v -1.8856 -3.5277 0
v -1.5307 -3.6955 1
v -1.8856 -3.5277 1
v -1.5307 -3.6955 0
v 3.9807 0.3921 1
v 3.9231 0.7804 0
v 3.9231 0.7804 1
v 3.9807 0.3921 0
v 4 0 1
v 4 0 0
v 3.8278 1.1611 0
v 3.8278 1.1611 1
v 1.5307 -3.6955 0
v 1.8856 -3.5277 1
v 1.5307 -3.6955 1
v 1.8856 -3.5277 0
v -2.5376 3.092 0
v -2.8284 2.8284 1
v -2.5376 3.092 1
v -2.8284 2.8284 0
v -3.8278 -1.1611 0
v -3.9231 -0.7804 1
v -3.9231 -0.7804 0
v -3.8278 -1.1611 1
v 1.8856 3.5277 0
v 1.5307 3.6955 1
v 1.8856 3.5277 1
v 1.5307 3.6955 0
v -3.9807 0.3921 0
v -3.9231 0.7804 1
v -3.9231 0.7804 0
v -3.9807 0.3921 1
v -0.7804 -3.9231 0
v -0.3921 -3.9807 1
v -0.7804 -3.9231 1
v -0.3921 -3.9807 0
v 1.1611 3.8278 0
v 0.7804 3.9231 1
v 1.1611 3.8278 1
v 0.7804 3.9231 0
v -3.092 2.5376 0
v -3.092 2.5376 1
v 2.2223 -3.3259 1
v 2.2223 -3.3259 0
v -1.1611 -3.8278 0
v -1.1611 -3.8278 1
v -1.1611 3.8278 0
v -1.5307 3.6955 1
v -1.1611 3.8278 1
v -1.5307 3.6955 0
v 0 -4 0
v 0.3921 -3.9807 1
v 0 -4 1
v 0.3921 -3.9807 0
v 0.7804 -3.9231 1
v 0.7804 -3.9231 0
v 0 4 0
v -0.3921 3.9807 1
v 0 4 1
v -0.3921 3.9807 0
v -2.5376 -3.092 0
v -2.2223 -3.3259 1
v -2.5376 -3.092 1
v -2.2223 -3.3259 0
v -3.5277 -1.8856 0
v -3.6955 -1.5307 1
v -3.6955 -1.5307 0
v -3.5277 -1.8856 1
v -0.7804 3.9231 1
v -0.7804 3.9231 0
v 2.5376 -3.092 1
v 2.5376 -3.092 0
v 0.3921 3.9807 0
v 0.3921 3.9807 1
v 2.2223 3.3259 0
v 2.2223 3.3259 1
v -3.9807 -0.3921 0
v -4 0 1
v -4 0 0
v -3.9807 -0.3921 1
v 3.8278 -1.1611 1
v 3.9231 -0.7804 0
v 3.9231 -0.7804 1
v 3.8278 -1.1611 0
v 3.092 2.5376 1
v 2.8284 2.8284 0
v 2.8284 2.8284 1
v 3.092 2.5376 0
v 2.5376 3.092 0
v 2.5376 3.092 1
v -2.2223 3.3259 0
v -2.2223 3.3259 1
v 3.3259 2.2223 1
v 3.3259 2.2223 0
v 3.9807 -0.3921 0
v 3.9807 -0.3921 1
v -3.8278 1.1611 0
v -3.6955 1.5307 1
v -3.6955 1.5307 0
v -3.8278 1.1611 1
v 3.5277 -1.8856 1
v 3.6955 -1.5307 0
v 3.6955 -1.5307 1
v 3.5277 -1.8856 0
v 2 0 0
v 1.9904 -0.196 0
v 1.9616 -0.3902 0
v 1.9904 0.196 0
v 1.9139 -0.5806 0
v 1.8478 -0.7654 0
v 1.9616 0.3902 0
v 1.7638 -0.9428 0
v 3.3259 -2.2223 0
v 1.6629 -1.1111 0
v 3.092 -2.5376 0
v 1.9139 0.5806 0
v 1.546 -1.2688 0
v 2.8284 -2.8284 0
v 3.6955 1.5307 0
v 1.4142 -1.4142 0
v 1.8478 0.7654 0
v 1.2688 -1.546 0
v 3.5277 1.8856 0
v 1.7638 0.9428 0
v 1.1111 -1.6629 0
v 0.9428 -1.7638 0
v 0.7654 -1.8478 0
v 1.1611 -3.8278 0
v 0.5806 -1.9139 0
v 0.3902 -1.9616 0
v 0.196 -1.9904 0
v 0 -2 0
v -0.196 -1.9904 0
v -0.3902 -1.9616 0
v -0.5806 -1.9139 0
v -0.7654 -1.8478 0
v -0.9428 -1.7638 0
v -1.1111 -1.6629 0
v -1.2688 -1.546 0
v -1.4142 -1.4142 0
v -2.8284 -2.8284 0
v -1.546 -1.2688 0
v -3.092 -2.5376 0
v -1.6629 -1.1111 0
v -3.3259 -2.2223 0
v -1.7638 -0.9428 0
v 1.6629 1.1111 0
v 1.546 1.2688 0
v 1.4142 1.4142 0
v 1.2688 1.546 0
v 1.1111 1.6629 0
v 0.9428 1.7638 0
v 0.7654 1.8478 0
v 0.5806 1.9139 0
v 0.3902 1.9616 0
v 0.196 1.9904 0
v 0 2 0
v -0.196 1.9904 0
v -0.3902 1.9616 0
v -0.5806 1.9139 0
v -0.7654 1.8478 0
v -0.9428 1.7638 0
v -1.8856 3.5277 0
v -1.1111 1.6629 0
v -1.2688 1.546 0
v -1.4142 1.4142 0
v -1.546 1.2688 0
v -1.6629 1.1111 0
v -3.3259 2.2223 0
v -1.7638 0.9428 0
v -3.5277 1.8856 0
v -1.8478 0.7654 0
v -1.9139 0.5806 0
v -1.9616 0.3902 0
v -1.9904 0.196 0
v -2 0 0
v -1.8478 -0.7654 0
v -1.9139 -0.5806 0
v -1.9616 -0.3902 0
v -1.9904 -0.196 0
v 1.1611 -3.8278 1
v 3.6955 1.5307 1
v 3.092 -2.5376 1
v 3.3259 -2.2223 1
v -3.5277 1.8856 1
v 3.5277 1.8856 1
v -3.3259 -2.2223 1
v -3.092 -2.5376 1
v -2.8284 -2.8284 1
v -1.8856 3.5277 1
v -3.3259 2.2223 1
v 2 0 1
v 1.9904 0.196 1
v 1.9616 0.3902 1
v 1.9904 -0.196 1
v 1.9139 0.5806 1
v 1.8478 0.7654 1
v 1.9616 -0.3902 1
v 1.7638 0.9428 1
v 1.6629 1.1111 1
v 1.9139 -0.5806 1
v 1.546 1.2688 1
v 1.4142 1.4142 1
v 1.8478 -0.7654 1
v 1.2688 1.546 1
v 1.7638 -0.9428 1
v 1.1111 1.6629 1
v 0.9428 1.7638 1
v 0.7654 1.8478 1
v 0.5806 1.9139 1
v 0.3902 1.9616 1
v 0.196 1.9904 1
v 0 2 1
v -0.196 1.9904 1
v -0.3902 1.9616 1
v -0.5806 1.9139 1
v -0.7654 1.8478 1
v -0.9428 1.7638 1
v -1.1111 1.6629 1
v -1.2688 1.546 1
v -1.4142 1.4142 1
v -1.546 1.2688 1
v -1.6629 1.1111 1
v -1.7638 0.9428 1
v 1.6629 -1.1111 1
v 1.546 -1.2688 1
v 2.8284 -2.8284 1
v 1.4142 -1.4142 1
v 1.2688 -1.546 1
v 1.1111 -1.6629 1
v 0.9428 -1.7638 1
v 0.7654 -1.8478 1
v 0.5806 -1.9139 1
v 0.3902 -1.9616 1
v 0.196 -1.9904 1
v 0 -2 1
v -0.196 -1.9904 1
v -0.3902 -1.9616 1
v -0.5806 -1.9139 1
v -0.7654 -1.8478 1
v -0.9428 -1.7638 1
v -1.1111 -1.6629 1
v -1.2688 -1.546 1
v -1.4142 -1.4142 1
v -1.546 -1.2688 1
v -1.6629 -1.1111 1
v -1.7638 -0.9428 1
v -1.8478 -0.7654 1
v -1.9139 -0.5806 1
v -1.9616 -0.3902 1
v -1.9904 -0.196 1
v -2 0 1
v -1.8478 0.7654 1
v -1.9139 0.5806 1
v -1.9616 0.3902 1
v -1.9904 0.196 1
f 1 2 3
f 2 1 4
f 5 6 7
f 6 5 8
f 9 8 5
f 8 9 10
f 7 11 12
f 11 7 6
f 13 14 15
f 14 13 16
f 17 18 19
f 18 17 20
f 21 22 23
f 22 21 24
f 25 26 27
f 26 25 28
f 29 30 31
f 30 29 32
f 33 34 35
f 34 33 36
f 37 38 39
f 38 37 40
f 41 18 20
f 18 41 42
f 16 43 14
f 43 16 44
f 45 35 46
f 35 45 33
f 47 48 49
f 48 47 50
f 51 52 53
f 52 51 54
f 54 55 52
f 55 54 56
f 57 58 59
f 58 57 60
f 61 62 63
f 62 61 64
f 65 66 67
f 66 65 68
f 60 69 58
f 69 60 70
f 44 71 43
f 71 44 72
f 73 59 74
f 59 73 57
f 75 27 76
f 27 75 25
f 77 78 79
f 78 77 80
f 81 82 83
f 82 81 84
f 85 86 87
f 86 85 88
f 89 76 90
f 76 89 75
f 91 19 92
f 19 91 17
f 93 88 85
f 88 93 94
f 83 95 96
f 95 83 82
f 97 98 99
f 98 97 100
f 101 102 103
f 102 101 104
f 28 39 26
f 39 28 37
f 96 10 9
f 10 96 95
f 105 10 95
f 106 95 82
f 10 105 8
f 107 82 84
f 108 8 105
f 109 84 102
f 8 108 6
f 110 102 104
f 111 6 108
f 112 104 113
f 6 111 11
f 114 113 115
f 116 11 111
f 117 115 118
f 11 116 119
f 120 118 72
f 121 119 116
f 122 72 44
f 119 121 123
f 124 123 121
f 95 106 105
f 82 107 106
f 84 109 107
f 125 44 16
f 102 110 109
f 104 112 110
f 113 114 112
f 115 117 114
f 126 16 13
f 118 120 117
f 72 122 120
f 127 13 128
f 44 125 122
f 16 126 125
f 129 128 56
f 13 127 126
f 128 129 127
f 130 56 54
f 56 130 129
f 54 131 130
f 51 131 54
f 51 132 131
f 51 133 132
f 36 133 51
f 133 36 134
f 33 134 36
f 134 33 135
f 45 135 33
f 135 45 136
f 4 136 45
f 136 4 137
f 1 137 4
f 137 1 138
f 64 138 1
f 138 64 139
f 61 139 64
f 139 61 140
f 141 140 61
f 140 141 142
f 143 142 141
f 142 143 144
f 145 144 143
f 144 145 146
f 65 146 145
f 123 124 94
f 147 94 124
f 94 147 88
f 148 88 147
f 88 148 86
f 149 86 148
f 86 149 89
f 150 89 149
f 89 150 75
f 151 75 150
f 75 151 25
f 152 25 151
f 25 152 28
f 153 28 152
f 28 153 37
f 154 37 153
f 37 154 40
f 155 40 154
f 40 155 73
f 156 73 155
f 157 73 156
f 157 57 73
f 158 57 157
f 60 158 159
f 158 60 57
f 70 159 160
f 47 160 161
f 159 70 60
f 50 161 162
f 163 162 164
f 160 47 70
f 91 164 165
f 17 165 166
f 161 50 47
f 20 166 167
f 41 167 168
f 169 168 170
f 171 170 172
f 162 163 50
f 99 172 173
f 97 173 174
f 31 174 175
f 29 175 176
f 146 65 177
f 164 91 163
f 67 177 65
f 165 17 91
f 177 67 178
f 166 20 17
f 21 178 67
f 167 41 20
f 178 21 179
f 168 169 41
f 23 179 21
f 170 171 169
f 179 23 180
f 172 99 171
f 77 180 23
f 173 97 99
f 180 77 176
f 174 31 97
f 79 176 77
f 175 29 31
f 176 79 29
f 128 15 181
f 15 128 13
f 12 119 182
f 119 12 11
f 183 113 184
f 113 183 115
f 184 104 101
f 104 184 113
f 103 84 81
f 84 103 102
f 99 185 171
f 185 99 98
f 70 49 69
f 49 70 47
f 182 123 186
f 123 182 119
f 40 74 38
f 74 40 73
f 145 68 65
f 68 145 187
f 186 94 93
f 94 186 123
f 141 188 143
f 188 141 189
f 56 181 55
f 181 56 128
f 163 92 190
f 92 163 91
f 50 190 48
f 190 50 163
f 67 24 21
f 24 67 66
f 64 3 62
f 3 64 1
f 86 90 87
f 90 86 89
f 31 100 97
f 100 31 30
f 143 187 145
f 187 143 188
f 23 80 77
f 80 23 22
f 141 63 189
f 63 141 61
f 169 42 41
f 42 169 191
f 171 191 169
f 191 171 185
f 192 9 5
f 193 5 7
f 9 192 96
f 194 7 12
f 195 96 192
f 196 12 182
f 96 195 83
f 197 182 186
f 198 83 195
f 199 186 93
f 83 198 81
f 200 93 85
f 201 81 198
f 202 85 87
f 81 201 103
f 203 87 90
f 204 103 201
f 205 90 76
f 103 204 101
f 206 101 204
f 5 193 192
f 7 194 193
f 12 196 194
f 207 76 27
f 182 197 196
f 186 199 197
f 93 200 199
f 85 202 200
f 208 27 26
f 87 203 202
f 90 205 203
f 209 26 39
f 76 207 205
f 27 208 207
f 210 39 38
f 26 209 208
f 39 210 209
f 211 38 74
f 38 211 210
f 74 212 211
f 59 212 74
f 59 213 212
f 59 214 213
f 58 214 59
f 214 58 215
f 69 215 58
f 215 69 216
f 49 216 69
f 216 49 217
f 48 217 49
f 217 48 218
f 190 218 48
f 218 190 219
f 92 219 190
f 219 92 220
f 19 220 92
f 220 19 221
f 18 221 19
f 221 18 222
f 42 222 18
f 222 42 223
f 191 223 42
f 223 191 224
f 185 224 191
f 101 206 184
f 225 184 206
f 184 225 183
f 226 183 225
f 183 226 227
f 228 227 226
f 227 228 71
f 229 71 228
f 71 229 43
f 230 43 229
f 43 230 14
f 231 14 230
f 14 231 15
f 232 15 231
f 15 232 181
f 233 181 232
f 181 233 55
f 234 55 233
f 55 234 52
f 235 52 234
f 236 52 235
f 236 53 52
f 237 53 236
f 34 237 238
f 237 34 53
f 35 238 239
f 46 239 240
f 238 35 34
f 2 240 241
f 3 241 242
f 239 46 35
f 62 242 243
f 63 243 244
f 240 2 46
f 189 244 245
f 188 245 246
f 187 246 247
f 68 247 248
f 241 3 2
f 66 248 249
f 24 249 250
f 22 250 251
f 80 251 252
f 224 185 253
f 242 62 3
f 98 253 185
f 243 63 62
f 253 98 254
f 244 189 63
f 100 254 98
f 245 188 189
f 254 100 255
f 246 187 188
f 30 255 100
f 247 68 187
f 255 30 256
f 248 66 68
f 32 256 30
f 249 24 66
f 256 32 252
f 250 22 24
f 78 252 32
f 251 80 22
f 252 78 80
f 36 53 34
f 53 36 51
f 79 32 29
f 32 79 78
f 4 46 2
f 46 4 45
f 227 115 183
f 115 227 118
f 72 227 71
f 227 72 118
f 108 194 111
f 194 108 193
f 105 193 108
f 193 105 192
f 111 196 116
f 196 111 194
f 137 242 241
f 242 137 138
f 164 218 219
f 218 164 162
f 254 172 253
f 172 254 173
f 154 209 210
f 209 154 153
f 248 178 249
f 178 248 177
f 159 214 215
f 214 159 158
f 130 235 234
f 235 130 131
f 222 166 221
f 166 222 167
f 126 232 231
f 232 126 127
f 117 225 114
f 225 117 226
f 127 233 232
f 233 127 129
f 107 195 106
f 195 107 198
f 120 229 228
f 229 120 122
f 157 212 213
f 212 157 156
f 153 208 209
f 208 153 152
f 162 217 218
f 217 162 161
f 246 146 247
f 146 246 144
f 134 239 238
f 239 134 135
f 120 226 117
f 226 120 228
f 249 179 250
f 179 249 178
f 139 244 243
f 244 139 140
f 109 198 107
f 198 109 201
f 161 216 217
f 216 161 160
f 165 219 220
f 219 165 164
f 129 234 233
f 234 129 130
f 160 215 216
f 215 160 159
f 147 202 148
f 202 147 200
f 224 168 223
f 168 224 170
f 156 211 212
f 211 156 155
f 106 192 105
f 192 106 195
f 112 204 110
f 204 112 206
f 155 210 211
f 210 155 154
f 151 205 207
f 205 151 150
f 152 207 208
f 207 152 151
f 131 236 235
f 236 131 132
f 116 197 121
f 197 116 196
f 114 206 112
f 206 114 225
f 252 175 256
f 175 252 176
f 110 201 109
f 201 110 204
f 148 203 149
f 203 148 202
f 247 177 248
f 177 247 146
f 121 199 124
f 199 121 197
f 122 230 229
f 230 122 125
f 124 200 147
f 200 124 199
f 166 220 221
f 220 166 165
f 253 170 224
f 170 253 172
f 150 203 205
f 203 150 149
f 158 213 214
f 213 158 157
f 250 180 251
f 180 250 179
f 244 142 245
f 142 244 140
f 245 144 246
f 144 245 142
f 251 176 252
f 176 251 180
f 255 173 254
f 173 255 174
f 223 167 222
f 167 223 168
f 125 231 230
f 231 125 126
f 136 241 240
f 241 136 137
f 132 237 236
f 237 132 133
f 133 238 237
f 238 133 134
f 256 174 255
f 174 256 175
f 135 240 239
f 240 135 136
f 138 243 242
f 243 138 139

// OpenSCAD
// Customizable Gasket
//  This is a simple open-source parametric gasket

zFite = 0.1; // z offset for fitting

// CUSTOMIZER VARIABLES
// Defines the number of facets for the gasket
$fn = 64; // [16:512]

// Defines the height of the gasket
gasket_thickness = 1; //[1:10]

// Defines the gasket outer diameter
gasket_outer_diameter = 2; //[2:100]

// Defines the gasket inner diameter
gasket_inner_diameter = 1; // Numeric value smaller than Gasket Outer Diameter

// CUSTOMIZER VARIABLES END

module gasket()
{
    difference()
    {
        cylinder(h = gasket_thickness, r = gasket_outer_diameter * 2);
        translate([ 0, 0, -zFite / 2 ]) cylinder(h = gasket_thickness + zFite, r = gasket_inner_diameter * 2);
    }
}

gasket();
